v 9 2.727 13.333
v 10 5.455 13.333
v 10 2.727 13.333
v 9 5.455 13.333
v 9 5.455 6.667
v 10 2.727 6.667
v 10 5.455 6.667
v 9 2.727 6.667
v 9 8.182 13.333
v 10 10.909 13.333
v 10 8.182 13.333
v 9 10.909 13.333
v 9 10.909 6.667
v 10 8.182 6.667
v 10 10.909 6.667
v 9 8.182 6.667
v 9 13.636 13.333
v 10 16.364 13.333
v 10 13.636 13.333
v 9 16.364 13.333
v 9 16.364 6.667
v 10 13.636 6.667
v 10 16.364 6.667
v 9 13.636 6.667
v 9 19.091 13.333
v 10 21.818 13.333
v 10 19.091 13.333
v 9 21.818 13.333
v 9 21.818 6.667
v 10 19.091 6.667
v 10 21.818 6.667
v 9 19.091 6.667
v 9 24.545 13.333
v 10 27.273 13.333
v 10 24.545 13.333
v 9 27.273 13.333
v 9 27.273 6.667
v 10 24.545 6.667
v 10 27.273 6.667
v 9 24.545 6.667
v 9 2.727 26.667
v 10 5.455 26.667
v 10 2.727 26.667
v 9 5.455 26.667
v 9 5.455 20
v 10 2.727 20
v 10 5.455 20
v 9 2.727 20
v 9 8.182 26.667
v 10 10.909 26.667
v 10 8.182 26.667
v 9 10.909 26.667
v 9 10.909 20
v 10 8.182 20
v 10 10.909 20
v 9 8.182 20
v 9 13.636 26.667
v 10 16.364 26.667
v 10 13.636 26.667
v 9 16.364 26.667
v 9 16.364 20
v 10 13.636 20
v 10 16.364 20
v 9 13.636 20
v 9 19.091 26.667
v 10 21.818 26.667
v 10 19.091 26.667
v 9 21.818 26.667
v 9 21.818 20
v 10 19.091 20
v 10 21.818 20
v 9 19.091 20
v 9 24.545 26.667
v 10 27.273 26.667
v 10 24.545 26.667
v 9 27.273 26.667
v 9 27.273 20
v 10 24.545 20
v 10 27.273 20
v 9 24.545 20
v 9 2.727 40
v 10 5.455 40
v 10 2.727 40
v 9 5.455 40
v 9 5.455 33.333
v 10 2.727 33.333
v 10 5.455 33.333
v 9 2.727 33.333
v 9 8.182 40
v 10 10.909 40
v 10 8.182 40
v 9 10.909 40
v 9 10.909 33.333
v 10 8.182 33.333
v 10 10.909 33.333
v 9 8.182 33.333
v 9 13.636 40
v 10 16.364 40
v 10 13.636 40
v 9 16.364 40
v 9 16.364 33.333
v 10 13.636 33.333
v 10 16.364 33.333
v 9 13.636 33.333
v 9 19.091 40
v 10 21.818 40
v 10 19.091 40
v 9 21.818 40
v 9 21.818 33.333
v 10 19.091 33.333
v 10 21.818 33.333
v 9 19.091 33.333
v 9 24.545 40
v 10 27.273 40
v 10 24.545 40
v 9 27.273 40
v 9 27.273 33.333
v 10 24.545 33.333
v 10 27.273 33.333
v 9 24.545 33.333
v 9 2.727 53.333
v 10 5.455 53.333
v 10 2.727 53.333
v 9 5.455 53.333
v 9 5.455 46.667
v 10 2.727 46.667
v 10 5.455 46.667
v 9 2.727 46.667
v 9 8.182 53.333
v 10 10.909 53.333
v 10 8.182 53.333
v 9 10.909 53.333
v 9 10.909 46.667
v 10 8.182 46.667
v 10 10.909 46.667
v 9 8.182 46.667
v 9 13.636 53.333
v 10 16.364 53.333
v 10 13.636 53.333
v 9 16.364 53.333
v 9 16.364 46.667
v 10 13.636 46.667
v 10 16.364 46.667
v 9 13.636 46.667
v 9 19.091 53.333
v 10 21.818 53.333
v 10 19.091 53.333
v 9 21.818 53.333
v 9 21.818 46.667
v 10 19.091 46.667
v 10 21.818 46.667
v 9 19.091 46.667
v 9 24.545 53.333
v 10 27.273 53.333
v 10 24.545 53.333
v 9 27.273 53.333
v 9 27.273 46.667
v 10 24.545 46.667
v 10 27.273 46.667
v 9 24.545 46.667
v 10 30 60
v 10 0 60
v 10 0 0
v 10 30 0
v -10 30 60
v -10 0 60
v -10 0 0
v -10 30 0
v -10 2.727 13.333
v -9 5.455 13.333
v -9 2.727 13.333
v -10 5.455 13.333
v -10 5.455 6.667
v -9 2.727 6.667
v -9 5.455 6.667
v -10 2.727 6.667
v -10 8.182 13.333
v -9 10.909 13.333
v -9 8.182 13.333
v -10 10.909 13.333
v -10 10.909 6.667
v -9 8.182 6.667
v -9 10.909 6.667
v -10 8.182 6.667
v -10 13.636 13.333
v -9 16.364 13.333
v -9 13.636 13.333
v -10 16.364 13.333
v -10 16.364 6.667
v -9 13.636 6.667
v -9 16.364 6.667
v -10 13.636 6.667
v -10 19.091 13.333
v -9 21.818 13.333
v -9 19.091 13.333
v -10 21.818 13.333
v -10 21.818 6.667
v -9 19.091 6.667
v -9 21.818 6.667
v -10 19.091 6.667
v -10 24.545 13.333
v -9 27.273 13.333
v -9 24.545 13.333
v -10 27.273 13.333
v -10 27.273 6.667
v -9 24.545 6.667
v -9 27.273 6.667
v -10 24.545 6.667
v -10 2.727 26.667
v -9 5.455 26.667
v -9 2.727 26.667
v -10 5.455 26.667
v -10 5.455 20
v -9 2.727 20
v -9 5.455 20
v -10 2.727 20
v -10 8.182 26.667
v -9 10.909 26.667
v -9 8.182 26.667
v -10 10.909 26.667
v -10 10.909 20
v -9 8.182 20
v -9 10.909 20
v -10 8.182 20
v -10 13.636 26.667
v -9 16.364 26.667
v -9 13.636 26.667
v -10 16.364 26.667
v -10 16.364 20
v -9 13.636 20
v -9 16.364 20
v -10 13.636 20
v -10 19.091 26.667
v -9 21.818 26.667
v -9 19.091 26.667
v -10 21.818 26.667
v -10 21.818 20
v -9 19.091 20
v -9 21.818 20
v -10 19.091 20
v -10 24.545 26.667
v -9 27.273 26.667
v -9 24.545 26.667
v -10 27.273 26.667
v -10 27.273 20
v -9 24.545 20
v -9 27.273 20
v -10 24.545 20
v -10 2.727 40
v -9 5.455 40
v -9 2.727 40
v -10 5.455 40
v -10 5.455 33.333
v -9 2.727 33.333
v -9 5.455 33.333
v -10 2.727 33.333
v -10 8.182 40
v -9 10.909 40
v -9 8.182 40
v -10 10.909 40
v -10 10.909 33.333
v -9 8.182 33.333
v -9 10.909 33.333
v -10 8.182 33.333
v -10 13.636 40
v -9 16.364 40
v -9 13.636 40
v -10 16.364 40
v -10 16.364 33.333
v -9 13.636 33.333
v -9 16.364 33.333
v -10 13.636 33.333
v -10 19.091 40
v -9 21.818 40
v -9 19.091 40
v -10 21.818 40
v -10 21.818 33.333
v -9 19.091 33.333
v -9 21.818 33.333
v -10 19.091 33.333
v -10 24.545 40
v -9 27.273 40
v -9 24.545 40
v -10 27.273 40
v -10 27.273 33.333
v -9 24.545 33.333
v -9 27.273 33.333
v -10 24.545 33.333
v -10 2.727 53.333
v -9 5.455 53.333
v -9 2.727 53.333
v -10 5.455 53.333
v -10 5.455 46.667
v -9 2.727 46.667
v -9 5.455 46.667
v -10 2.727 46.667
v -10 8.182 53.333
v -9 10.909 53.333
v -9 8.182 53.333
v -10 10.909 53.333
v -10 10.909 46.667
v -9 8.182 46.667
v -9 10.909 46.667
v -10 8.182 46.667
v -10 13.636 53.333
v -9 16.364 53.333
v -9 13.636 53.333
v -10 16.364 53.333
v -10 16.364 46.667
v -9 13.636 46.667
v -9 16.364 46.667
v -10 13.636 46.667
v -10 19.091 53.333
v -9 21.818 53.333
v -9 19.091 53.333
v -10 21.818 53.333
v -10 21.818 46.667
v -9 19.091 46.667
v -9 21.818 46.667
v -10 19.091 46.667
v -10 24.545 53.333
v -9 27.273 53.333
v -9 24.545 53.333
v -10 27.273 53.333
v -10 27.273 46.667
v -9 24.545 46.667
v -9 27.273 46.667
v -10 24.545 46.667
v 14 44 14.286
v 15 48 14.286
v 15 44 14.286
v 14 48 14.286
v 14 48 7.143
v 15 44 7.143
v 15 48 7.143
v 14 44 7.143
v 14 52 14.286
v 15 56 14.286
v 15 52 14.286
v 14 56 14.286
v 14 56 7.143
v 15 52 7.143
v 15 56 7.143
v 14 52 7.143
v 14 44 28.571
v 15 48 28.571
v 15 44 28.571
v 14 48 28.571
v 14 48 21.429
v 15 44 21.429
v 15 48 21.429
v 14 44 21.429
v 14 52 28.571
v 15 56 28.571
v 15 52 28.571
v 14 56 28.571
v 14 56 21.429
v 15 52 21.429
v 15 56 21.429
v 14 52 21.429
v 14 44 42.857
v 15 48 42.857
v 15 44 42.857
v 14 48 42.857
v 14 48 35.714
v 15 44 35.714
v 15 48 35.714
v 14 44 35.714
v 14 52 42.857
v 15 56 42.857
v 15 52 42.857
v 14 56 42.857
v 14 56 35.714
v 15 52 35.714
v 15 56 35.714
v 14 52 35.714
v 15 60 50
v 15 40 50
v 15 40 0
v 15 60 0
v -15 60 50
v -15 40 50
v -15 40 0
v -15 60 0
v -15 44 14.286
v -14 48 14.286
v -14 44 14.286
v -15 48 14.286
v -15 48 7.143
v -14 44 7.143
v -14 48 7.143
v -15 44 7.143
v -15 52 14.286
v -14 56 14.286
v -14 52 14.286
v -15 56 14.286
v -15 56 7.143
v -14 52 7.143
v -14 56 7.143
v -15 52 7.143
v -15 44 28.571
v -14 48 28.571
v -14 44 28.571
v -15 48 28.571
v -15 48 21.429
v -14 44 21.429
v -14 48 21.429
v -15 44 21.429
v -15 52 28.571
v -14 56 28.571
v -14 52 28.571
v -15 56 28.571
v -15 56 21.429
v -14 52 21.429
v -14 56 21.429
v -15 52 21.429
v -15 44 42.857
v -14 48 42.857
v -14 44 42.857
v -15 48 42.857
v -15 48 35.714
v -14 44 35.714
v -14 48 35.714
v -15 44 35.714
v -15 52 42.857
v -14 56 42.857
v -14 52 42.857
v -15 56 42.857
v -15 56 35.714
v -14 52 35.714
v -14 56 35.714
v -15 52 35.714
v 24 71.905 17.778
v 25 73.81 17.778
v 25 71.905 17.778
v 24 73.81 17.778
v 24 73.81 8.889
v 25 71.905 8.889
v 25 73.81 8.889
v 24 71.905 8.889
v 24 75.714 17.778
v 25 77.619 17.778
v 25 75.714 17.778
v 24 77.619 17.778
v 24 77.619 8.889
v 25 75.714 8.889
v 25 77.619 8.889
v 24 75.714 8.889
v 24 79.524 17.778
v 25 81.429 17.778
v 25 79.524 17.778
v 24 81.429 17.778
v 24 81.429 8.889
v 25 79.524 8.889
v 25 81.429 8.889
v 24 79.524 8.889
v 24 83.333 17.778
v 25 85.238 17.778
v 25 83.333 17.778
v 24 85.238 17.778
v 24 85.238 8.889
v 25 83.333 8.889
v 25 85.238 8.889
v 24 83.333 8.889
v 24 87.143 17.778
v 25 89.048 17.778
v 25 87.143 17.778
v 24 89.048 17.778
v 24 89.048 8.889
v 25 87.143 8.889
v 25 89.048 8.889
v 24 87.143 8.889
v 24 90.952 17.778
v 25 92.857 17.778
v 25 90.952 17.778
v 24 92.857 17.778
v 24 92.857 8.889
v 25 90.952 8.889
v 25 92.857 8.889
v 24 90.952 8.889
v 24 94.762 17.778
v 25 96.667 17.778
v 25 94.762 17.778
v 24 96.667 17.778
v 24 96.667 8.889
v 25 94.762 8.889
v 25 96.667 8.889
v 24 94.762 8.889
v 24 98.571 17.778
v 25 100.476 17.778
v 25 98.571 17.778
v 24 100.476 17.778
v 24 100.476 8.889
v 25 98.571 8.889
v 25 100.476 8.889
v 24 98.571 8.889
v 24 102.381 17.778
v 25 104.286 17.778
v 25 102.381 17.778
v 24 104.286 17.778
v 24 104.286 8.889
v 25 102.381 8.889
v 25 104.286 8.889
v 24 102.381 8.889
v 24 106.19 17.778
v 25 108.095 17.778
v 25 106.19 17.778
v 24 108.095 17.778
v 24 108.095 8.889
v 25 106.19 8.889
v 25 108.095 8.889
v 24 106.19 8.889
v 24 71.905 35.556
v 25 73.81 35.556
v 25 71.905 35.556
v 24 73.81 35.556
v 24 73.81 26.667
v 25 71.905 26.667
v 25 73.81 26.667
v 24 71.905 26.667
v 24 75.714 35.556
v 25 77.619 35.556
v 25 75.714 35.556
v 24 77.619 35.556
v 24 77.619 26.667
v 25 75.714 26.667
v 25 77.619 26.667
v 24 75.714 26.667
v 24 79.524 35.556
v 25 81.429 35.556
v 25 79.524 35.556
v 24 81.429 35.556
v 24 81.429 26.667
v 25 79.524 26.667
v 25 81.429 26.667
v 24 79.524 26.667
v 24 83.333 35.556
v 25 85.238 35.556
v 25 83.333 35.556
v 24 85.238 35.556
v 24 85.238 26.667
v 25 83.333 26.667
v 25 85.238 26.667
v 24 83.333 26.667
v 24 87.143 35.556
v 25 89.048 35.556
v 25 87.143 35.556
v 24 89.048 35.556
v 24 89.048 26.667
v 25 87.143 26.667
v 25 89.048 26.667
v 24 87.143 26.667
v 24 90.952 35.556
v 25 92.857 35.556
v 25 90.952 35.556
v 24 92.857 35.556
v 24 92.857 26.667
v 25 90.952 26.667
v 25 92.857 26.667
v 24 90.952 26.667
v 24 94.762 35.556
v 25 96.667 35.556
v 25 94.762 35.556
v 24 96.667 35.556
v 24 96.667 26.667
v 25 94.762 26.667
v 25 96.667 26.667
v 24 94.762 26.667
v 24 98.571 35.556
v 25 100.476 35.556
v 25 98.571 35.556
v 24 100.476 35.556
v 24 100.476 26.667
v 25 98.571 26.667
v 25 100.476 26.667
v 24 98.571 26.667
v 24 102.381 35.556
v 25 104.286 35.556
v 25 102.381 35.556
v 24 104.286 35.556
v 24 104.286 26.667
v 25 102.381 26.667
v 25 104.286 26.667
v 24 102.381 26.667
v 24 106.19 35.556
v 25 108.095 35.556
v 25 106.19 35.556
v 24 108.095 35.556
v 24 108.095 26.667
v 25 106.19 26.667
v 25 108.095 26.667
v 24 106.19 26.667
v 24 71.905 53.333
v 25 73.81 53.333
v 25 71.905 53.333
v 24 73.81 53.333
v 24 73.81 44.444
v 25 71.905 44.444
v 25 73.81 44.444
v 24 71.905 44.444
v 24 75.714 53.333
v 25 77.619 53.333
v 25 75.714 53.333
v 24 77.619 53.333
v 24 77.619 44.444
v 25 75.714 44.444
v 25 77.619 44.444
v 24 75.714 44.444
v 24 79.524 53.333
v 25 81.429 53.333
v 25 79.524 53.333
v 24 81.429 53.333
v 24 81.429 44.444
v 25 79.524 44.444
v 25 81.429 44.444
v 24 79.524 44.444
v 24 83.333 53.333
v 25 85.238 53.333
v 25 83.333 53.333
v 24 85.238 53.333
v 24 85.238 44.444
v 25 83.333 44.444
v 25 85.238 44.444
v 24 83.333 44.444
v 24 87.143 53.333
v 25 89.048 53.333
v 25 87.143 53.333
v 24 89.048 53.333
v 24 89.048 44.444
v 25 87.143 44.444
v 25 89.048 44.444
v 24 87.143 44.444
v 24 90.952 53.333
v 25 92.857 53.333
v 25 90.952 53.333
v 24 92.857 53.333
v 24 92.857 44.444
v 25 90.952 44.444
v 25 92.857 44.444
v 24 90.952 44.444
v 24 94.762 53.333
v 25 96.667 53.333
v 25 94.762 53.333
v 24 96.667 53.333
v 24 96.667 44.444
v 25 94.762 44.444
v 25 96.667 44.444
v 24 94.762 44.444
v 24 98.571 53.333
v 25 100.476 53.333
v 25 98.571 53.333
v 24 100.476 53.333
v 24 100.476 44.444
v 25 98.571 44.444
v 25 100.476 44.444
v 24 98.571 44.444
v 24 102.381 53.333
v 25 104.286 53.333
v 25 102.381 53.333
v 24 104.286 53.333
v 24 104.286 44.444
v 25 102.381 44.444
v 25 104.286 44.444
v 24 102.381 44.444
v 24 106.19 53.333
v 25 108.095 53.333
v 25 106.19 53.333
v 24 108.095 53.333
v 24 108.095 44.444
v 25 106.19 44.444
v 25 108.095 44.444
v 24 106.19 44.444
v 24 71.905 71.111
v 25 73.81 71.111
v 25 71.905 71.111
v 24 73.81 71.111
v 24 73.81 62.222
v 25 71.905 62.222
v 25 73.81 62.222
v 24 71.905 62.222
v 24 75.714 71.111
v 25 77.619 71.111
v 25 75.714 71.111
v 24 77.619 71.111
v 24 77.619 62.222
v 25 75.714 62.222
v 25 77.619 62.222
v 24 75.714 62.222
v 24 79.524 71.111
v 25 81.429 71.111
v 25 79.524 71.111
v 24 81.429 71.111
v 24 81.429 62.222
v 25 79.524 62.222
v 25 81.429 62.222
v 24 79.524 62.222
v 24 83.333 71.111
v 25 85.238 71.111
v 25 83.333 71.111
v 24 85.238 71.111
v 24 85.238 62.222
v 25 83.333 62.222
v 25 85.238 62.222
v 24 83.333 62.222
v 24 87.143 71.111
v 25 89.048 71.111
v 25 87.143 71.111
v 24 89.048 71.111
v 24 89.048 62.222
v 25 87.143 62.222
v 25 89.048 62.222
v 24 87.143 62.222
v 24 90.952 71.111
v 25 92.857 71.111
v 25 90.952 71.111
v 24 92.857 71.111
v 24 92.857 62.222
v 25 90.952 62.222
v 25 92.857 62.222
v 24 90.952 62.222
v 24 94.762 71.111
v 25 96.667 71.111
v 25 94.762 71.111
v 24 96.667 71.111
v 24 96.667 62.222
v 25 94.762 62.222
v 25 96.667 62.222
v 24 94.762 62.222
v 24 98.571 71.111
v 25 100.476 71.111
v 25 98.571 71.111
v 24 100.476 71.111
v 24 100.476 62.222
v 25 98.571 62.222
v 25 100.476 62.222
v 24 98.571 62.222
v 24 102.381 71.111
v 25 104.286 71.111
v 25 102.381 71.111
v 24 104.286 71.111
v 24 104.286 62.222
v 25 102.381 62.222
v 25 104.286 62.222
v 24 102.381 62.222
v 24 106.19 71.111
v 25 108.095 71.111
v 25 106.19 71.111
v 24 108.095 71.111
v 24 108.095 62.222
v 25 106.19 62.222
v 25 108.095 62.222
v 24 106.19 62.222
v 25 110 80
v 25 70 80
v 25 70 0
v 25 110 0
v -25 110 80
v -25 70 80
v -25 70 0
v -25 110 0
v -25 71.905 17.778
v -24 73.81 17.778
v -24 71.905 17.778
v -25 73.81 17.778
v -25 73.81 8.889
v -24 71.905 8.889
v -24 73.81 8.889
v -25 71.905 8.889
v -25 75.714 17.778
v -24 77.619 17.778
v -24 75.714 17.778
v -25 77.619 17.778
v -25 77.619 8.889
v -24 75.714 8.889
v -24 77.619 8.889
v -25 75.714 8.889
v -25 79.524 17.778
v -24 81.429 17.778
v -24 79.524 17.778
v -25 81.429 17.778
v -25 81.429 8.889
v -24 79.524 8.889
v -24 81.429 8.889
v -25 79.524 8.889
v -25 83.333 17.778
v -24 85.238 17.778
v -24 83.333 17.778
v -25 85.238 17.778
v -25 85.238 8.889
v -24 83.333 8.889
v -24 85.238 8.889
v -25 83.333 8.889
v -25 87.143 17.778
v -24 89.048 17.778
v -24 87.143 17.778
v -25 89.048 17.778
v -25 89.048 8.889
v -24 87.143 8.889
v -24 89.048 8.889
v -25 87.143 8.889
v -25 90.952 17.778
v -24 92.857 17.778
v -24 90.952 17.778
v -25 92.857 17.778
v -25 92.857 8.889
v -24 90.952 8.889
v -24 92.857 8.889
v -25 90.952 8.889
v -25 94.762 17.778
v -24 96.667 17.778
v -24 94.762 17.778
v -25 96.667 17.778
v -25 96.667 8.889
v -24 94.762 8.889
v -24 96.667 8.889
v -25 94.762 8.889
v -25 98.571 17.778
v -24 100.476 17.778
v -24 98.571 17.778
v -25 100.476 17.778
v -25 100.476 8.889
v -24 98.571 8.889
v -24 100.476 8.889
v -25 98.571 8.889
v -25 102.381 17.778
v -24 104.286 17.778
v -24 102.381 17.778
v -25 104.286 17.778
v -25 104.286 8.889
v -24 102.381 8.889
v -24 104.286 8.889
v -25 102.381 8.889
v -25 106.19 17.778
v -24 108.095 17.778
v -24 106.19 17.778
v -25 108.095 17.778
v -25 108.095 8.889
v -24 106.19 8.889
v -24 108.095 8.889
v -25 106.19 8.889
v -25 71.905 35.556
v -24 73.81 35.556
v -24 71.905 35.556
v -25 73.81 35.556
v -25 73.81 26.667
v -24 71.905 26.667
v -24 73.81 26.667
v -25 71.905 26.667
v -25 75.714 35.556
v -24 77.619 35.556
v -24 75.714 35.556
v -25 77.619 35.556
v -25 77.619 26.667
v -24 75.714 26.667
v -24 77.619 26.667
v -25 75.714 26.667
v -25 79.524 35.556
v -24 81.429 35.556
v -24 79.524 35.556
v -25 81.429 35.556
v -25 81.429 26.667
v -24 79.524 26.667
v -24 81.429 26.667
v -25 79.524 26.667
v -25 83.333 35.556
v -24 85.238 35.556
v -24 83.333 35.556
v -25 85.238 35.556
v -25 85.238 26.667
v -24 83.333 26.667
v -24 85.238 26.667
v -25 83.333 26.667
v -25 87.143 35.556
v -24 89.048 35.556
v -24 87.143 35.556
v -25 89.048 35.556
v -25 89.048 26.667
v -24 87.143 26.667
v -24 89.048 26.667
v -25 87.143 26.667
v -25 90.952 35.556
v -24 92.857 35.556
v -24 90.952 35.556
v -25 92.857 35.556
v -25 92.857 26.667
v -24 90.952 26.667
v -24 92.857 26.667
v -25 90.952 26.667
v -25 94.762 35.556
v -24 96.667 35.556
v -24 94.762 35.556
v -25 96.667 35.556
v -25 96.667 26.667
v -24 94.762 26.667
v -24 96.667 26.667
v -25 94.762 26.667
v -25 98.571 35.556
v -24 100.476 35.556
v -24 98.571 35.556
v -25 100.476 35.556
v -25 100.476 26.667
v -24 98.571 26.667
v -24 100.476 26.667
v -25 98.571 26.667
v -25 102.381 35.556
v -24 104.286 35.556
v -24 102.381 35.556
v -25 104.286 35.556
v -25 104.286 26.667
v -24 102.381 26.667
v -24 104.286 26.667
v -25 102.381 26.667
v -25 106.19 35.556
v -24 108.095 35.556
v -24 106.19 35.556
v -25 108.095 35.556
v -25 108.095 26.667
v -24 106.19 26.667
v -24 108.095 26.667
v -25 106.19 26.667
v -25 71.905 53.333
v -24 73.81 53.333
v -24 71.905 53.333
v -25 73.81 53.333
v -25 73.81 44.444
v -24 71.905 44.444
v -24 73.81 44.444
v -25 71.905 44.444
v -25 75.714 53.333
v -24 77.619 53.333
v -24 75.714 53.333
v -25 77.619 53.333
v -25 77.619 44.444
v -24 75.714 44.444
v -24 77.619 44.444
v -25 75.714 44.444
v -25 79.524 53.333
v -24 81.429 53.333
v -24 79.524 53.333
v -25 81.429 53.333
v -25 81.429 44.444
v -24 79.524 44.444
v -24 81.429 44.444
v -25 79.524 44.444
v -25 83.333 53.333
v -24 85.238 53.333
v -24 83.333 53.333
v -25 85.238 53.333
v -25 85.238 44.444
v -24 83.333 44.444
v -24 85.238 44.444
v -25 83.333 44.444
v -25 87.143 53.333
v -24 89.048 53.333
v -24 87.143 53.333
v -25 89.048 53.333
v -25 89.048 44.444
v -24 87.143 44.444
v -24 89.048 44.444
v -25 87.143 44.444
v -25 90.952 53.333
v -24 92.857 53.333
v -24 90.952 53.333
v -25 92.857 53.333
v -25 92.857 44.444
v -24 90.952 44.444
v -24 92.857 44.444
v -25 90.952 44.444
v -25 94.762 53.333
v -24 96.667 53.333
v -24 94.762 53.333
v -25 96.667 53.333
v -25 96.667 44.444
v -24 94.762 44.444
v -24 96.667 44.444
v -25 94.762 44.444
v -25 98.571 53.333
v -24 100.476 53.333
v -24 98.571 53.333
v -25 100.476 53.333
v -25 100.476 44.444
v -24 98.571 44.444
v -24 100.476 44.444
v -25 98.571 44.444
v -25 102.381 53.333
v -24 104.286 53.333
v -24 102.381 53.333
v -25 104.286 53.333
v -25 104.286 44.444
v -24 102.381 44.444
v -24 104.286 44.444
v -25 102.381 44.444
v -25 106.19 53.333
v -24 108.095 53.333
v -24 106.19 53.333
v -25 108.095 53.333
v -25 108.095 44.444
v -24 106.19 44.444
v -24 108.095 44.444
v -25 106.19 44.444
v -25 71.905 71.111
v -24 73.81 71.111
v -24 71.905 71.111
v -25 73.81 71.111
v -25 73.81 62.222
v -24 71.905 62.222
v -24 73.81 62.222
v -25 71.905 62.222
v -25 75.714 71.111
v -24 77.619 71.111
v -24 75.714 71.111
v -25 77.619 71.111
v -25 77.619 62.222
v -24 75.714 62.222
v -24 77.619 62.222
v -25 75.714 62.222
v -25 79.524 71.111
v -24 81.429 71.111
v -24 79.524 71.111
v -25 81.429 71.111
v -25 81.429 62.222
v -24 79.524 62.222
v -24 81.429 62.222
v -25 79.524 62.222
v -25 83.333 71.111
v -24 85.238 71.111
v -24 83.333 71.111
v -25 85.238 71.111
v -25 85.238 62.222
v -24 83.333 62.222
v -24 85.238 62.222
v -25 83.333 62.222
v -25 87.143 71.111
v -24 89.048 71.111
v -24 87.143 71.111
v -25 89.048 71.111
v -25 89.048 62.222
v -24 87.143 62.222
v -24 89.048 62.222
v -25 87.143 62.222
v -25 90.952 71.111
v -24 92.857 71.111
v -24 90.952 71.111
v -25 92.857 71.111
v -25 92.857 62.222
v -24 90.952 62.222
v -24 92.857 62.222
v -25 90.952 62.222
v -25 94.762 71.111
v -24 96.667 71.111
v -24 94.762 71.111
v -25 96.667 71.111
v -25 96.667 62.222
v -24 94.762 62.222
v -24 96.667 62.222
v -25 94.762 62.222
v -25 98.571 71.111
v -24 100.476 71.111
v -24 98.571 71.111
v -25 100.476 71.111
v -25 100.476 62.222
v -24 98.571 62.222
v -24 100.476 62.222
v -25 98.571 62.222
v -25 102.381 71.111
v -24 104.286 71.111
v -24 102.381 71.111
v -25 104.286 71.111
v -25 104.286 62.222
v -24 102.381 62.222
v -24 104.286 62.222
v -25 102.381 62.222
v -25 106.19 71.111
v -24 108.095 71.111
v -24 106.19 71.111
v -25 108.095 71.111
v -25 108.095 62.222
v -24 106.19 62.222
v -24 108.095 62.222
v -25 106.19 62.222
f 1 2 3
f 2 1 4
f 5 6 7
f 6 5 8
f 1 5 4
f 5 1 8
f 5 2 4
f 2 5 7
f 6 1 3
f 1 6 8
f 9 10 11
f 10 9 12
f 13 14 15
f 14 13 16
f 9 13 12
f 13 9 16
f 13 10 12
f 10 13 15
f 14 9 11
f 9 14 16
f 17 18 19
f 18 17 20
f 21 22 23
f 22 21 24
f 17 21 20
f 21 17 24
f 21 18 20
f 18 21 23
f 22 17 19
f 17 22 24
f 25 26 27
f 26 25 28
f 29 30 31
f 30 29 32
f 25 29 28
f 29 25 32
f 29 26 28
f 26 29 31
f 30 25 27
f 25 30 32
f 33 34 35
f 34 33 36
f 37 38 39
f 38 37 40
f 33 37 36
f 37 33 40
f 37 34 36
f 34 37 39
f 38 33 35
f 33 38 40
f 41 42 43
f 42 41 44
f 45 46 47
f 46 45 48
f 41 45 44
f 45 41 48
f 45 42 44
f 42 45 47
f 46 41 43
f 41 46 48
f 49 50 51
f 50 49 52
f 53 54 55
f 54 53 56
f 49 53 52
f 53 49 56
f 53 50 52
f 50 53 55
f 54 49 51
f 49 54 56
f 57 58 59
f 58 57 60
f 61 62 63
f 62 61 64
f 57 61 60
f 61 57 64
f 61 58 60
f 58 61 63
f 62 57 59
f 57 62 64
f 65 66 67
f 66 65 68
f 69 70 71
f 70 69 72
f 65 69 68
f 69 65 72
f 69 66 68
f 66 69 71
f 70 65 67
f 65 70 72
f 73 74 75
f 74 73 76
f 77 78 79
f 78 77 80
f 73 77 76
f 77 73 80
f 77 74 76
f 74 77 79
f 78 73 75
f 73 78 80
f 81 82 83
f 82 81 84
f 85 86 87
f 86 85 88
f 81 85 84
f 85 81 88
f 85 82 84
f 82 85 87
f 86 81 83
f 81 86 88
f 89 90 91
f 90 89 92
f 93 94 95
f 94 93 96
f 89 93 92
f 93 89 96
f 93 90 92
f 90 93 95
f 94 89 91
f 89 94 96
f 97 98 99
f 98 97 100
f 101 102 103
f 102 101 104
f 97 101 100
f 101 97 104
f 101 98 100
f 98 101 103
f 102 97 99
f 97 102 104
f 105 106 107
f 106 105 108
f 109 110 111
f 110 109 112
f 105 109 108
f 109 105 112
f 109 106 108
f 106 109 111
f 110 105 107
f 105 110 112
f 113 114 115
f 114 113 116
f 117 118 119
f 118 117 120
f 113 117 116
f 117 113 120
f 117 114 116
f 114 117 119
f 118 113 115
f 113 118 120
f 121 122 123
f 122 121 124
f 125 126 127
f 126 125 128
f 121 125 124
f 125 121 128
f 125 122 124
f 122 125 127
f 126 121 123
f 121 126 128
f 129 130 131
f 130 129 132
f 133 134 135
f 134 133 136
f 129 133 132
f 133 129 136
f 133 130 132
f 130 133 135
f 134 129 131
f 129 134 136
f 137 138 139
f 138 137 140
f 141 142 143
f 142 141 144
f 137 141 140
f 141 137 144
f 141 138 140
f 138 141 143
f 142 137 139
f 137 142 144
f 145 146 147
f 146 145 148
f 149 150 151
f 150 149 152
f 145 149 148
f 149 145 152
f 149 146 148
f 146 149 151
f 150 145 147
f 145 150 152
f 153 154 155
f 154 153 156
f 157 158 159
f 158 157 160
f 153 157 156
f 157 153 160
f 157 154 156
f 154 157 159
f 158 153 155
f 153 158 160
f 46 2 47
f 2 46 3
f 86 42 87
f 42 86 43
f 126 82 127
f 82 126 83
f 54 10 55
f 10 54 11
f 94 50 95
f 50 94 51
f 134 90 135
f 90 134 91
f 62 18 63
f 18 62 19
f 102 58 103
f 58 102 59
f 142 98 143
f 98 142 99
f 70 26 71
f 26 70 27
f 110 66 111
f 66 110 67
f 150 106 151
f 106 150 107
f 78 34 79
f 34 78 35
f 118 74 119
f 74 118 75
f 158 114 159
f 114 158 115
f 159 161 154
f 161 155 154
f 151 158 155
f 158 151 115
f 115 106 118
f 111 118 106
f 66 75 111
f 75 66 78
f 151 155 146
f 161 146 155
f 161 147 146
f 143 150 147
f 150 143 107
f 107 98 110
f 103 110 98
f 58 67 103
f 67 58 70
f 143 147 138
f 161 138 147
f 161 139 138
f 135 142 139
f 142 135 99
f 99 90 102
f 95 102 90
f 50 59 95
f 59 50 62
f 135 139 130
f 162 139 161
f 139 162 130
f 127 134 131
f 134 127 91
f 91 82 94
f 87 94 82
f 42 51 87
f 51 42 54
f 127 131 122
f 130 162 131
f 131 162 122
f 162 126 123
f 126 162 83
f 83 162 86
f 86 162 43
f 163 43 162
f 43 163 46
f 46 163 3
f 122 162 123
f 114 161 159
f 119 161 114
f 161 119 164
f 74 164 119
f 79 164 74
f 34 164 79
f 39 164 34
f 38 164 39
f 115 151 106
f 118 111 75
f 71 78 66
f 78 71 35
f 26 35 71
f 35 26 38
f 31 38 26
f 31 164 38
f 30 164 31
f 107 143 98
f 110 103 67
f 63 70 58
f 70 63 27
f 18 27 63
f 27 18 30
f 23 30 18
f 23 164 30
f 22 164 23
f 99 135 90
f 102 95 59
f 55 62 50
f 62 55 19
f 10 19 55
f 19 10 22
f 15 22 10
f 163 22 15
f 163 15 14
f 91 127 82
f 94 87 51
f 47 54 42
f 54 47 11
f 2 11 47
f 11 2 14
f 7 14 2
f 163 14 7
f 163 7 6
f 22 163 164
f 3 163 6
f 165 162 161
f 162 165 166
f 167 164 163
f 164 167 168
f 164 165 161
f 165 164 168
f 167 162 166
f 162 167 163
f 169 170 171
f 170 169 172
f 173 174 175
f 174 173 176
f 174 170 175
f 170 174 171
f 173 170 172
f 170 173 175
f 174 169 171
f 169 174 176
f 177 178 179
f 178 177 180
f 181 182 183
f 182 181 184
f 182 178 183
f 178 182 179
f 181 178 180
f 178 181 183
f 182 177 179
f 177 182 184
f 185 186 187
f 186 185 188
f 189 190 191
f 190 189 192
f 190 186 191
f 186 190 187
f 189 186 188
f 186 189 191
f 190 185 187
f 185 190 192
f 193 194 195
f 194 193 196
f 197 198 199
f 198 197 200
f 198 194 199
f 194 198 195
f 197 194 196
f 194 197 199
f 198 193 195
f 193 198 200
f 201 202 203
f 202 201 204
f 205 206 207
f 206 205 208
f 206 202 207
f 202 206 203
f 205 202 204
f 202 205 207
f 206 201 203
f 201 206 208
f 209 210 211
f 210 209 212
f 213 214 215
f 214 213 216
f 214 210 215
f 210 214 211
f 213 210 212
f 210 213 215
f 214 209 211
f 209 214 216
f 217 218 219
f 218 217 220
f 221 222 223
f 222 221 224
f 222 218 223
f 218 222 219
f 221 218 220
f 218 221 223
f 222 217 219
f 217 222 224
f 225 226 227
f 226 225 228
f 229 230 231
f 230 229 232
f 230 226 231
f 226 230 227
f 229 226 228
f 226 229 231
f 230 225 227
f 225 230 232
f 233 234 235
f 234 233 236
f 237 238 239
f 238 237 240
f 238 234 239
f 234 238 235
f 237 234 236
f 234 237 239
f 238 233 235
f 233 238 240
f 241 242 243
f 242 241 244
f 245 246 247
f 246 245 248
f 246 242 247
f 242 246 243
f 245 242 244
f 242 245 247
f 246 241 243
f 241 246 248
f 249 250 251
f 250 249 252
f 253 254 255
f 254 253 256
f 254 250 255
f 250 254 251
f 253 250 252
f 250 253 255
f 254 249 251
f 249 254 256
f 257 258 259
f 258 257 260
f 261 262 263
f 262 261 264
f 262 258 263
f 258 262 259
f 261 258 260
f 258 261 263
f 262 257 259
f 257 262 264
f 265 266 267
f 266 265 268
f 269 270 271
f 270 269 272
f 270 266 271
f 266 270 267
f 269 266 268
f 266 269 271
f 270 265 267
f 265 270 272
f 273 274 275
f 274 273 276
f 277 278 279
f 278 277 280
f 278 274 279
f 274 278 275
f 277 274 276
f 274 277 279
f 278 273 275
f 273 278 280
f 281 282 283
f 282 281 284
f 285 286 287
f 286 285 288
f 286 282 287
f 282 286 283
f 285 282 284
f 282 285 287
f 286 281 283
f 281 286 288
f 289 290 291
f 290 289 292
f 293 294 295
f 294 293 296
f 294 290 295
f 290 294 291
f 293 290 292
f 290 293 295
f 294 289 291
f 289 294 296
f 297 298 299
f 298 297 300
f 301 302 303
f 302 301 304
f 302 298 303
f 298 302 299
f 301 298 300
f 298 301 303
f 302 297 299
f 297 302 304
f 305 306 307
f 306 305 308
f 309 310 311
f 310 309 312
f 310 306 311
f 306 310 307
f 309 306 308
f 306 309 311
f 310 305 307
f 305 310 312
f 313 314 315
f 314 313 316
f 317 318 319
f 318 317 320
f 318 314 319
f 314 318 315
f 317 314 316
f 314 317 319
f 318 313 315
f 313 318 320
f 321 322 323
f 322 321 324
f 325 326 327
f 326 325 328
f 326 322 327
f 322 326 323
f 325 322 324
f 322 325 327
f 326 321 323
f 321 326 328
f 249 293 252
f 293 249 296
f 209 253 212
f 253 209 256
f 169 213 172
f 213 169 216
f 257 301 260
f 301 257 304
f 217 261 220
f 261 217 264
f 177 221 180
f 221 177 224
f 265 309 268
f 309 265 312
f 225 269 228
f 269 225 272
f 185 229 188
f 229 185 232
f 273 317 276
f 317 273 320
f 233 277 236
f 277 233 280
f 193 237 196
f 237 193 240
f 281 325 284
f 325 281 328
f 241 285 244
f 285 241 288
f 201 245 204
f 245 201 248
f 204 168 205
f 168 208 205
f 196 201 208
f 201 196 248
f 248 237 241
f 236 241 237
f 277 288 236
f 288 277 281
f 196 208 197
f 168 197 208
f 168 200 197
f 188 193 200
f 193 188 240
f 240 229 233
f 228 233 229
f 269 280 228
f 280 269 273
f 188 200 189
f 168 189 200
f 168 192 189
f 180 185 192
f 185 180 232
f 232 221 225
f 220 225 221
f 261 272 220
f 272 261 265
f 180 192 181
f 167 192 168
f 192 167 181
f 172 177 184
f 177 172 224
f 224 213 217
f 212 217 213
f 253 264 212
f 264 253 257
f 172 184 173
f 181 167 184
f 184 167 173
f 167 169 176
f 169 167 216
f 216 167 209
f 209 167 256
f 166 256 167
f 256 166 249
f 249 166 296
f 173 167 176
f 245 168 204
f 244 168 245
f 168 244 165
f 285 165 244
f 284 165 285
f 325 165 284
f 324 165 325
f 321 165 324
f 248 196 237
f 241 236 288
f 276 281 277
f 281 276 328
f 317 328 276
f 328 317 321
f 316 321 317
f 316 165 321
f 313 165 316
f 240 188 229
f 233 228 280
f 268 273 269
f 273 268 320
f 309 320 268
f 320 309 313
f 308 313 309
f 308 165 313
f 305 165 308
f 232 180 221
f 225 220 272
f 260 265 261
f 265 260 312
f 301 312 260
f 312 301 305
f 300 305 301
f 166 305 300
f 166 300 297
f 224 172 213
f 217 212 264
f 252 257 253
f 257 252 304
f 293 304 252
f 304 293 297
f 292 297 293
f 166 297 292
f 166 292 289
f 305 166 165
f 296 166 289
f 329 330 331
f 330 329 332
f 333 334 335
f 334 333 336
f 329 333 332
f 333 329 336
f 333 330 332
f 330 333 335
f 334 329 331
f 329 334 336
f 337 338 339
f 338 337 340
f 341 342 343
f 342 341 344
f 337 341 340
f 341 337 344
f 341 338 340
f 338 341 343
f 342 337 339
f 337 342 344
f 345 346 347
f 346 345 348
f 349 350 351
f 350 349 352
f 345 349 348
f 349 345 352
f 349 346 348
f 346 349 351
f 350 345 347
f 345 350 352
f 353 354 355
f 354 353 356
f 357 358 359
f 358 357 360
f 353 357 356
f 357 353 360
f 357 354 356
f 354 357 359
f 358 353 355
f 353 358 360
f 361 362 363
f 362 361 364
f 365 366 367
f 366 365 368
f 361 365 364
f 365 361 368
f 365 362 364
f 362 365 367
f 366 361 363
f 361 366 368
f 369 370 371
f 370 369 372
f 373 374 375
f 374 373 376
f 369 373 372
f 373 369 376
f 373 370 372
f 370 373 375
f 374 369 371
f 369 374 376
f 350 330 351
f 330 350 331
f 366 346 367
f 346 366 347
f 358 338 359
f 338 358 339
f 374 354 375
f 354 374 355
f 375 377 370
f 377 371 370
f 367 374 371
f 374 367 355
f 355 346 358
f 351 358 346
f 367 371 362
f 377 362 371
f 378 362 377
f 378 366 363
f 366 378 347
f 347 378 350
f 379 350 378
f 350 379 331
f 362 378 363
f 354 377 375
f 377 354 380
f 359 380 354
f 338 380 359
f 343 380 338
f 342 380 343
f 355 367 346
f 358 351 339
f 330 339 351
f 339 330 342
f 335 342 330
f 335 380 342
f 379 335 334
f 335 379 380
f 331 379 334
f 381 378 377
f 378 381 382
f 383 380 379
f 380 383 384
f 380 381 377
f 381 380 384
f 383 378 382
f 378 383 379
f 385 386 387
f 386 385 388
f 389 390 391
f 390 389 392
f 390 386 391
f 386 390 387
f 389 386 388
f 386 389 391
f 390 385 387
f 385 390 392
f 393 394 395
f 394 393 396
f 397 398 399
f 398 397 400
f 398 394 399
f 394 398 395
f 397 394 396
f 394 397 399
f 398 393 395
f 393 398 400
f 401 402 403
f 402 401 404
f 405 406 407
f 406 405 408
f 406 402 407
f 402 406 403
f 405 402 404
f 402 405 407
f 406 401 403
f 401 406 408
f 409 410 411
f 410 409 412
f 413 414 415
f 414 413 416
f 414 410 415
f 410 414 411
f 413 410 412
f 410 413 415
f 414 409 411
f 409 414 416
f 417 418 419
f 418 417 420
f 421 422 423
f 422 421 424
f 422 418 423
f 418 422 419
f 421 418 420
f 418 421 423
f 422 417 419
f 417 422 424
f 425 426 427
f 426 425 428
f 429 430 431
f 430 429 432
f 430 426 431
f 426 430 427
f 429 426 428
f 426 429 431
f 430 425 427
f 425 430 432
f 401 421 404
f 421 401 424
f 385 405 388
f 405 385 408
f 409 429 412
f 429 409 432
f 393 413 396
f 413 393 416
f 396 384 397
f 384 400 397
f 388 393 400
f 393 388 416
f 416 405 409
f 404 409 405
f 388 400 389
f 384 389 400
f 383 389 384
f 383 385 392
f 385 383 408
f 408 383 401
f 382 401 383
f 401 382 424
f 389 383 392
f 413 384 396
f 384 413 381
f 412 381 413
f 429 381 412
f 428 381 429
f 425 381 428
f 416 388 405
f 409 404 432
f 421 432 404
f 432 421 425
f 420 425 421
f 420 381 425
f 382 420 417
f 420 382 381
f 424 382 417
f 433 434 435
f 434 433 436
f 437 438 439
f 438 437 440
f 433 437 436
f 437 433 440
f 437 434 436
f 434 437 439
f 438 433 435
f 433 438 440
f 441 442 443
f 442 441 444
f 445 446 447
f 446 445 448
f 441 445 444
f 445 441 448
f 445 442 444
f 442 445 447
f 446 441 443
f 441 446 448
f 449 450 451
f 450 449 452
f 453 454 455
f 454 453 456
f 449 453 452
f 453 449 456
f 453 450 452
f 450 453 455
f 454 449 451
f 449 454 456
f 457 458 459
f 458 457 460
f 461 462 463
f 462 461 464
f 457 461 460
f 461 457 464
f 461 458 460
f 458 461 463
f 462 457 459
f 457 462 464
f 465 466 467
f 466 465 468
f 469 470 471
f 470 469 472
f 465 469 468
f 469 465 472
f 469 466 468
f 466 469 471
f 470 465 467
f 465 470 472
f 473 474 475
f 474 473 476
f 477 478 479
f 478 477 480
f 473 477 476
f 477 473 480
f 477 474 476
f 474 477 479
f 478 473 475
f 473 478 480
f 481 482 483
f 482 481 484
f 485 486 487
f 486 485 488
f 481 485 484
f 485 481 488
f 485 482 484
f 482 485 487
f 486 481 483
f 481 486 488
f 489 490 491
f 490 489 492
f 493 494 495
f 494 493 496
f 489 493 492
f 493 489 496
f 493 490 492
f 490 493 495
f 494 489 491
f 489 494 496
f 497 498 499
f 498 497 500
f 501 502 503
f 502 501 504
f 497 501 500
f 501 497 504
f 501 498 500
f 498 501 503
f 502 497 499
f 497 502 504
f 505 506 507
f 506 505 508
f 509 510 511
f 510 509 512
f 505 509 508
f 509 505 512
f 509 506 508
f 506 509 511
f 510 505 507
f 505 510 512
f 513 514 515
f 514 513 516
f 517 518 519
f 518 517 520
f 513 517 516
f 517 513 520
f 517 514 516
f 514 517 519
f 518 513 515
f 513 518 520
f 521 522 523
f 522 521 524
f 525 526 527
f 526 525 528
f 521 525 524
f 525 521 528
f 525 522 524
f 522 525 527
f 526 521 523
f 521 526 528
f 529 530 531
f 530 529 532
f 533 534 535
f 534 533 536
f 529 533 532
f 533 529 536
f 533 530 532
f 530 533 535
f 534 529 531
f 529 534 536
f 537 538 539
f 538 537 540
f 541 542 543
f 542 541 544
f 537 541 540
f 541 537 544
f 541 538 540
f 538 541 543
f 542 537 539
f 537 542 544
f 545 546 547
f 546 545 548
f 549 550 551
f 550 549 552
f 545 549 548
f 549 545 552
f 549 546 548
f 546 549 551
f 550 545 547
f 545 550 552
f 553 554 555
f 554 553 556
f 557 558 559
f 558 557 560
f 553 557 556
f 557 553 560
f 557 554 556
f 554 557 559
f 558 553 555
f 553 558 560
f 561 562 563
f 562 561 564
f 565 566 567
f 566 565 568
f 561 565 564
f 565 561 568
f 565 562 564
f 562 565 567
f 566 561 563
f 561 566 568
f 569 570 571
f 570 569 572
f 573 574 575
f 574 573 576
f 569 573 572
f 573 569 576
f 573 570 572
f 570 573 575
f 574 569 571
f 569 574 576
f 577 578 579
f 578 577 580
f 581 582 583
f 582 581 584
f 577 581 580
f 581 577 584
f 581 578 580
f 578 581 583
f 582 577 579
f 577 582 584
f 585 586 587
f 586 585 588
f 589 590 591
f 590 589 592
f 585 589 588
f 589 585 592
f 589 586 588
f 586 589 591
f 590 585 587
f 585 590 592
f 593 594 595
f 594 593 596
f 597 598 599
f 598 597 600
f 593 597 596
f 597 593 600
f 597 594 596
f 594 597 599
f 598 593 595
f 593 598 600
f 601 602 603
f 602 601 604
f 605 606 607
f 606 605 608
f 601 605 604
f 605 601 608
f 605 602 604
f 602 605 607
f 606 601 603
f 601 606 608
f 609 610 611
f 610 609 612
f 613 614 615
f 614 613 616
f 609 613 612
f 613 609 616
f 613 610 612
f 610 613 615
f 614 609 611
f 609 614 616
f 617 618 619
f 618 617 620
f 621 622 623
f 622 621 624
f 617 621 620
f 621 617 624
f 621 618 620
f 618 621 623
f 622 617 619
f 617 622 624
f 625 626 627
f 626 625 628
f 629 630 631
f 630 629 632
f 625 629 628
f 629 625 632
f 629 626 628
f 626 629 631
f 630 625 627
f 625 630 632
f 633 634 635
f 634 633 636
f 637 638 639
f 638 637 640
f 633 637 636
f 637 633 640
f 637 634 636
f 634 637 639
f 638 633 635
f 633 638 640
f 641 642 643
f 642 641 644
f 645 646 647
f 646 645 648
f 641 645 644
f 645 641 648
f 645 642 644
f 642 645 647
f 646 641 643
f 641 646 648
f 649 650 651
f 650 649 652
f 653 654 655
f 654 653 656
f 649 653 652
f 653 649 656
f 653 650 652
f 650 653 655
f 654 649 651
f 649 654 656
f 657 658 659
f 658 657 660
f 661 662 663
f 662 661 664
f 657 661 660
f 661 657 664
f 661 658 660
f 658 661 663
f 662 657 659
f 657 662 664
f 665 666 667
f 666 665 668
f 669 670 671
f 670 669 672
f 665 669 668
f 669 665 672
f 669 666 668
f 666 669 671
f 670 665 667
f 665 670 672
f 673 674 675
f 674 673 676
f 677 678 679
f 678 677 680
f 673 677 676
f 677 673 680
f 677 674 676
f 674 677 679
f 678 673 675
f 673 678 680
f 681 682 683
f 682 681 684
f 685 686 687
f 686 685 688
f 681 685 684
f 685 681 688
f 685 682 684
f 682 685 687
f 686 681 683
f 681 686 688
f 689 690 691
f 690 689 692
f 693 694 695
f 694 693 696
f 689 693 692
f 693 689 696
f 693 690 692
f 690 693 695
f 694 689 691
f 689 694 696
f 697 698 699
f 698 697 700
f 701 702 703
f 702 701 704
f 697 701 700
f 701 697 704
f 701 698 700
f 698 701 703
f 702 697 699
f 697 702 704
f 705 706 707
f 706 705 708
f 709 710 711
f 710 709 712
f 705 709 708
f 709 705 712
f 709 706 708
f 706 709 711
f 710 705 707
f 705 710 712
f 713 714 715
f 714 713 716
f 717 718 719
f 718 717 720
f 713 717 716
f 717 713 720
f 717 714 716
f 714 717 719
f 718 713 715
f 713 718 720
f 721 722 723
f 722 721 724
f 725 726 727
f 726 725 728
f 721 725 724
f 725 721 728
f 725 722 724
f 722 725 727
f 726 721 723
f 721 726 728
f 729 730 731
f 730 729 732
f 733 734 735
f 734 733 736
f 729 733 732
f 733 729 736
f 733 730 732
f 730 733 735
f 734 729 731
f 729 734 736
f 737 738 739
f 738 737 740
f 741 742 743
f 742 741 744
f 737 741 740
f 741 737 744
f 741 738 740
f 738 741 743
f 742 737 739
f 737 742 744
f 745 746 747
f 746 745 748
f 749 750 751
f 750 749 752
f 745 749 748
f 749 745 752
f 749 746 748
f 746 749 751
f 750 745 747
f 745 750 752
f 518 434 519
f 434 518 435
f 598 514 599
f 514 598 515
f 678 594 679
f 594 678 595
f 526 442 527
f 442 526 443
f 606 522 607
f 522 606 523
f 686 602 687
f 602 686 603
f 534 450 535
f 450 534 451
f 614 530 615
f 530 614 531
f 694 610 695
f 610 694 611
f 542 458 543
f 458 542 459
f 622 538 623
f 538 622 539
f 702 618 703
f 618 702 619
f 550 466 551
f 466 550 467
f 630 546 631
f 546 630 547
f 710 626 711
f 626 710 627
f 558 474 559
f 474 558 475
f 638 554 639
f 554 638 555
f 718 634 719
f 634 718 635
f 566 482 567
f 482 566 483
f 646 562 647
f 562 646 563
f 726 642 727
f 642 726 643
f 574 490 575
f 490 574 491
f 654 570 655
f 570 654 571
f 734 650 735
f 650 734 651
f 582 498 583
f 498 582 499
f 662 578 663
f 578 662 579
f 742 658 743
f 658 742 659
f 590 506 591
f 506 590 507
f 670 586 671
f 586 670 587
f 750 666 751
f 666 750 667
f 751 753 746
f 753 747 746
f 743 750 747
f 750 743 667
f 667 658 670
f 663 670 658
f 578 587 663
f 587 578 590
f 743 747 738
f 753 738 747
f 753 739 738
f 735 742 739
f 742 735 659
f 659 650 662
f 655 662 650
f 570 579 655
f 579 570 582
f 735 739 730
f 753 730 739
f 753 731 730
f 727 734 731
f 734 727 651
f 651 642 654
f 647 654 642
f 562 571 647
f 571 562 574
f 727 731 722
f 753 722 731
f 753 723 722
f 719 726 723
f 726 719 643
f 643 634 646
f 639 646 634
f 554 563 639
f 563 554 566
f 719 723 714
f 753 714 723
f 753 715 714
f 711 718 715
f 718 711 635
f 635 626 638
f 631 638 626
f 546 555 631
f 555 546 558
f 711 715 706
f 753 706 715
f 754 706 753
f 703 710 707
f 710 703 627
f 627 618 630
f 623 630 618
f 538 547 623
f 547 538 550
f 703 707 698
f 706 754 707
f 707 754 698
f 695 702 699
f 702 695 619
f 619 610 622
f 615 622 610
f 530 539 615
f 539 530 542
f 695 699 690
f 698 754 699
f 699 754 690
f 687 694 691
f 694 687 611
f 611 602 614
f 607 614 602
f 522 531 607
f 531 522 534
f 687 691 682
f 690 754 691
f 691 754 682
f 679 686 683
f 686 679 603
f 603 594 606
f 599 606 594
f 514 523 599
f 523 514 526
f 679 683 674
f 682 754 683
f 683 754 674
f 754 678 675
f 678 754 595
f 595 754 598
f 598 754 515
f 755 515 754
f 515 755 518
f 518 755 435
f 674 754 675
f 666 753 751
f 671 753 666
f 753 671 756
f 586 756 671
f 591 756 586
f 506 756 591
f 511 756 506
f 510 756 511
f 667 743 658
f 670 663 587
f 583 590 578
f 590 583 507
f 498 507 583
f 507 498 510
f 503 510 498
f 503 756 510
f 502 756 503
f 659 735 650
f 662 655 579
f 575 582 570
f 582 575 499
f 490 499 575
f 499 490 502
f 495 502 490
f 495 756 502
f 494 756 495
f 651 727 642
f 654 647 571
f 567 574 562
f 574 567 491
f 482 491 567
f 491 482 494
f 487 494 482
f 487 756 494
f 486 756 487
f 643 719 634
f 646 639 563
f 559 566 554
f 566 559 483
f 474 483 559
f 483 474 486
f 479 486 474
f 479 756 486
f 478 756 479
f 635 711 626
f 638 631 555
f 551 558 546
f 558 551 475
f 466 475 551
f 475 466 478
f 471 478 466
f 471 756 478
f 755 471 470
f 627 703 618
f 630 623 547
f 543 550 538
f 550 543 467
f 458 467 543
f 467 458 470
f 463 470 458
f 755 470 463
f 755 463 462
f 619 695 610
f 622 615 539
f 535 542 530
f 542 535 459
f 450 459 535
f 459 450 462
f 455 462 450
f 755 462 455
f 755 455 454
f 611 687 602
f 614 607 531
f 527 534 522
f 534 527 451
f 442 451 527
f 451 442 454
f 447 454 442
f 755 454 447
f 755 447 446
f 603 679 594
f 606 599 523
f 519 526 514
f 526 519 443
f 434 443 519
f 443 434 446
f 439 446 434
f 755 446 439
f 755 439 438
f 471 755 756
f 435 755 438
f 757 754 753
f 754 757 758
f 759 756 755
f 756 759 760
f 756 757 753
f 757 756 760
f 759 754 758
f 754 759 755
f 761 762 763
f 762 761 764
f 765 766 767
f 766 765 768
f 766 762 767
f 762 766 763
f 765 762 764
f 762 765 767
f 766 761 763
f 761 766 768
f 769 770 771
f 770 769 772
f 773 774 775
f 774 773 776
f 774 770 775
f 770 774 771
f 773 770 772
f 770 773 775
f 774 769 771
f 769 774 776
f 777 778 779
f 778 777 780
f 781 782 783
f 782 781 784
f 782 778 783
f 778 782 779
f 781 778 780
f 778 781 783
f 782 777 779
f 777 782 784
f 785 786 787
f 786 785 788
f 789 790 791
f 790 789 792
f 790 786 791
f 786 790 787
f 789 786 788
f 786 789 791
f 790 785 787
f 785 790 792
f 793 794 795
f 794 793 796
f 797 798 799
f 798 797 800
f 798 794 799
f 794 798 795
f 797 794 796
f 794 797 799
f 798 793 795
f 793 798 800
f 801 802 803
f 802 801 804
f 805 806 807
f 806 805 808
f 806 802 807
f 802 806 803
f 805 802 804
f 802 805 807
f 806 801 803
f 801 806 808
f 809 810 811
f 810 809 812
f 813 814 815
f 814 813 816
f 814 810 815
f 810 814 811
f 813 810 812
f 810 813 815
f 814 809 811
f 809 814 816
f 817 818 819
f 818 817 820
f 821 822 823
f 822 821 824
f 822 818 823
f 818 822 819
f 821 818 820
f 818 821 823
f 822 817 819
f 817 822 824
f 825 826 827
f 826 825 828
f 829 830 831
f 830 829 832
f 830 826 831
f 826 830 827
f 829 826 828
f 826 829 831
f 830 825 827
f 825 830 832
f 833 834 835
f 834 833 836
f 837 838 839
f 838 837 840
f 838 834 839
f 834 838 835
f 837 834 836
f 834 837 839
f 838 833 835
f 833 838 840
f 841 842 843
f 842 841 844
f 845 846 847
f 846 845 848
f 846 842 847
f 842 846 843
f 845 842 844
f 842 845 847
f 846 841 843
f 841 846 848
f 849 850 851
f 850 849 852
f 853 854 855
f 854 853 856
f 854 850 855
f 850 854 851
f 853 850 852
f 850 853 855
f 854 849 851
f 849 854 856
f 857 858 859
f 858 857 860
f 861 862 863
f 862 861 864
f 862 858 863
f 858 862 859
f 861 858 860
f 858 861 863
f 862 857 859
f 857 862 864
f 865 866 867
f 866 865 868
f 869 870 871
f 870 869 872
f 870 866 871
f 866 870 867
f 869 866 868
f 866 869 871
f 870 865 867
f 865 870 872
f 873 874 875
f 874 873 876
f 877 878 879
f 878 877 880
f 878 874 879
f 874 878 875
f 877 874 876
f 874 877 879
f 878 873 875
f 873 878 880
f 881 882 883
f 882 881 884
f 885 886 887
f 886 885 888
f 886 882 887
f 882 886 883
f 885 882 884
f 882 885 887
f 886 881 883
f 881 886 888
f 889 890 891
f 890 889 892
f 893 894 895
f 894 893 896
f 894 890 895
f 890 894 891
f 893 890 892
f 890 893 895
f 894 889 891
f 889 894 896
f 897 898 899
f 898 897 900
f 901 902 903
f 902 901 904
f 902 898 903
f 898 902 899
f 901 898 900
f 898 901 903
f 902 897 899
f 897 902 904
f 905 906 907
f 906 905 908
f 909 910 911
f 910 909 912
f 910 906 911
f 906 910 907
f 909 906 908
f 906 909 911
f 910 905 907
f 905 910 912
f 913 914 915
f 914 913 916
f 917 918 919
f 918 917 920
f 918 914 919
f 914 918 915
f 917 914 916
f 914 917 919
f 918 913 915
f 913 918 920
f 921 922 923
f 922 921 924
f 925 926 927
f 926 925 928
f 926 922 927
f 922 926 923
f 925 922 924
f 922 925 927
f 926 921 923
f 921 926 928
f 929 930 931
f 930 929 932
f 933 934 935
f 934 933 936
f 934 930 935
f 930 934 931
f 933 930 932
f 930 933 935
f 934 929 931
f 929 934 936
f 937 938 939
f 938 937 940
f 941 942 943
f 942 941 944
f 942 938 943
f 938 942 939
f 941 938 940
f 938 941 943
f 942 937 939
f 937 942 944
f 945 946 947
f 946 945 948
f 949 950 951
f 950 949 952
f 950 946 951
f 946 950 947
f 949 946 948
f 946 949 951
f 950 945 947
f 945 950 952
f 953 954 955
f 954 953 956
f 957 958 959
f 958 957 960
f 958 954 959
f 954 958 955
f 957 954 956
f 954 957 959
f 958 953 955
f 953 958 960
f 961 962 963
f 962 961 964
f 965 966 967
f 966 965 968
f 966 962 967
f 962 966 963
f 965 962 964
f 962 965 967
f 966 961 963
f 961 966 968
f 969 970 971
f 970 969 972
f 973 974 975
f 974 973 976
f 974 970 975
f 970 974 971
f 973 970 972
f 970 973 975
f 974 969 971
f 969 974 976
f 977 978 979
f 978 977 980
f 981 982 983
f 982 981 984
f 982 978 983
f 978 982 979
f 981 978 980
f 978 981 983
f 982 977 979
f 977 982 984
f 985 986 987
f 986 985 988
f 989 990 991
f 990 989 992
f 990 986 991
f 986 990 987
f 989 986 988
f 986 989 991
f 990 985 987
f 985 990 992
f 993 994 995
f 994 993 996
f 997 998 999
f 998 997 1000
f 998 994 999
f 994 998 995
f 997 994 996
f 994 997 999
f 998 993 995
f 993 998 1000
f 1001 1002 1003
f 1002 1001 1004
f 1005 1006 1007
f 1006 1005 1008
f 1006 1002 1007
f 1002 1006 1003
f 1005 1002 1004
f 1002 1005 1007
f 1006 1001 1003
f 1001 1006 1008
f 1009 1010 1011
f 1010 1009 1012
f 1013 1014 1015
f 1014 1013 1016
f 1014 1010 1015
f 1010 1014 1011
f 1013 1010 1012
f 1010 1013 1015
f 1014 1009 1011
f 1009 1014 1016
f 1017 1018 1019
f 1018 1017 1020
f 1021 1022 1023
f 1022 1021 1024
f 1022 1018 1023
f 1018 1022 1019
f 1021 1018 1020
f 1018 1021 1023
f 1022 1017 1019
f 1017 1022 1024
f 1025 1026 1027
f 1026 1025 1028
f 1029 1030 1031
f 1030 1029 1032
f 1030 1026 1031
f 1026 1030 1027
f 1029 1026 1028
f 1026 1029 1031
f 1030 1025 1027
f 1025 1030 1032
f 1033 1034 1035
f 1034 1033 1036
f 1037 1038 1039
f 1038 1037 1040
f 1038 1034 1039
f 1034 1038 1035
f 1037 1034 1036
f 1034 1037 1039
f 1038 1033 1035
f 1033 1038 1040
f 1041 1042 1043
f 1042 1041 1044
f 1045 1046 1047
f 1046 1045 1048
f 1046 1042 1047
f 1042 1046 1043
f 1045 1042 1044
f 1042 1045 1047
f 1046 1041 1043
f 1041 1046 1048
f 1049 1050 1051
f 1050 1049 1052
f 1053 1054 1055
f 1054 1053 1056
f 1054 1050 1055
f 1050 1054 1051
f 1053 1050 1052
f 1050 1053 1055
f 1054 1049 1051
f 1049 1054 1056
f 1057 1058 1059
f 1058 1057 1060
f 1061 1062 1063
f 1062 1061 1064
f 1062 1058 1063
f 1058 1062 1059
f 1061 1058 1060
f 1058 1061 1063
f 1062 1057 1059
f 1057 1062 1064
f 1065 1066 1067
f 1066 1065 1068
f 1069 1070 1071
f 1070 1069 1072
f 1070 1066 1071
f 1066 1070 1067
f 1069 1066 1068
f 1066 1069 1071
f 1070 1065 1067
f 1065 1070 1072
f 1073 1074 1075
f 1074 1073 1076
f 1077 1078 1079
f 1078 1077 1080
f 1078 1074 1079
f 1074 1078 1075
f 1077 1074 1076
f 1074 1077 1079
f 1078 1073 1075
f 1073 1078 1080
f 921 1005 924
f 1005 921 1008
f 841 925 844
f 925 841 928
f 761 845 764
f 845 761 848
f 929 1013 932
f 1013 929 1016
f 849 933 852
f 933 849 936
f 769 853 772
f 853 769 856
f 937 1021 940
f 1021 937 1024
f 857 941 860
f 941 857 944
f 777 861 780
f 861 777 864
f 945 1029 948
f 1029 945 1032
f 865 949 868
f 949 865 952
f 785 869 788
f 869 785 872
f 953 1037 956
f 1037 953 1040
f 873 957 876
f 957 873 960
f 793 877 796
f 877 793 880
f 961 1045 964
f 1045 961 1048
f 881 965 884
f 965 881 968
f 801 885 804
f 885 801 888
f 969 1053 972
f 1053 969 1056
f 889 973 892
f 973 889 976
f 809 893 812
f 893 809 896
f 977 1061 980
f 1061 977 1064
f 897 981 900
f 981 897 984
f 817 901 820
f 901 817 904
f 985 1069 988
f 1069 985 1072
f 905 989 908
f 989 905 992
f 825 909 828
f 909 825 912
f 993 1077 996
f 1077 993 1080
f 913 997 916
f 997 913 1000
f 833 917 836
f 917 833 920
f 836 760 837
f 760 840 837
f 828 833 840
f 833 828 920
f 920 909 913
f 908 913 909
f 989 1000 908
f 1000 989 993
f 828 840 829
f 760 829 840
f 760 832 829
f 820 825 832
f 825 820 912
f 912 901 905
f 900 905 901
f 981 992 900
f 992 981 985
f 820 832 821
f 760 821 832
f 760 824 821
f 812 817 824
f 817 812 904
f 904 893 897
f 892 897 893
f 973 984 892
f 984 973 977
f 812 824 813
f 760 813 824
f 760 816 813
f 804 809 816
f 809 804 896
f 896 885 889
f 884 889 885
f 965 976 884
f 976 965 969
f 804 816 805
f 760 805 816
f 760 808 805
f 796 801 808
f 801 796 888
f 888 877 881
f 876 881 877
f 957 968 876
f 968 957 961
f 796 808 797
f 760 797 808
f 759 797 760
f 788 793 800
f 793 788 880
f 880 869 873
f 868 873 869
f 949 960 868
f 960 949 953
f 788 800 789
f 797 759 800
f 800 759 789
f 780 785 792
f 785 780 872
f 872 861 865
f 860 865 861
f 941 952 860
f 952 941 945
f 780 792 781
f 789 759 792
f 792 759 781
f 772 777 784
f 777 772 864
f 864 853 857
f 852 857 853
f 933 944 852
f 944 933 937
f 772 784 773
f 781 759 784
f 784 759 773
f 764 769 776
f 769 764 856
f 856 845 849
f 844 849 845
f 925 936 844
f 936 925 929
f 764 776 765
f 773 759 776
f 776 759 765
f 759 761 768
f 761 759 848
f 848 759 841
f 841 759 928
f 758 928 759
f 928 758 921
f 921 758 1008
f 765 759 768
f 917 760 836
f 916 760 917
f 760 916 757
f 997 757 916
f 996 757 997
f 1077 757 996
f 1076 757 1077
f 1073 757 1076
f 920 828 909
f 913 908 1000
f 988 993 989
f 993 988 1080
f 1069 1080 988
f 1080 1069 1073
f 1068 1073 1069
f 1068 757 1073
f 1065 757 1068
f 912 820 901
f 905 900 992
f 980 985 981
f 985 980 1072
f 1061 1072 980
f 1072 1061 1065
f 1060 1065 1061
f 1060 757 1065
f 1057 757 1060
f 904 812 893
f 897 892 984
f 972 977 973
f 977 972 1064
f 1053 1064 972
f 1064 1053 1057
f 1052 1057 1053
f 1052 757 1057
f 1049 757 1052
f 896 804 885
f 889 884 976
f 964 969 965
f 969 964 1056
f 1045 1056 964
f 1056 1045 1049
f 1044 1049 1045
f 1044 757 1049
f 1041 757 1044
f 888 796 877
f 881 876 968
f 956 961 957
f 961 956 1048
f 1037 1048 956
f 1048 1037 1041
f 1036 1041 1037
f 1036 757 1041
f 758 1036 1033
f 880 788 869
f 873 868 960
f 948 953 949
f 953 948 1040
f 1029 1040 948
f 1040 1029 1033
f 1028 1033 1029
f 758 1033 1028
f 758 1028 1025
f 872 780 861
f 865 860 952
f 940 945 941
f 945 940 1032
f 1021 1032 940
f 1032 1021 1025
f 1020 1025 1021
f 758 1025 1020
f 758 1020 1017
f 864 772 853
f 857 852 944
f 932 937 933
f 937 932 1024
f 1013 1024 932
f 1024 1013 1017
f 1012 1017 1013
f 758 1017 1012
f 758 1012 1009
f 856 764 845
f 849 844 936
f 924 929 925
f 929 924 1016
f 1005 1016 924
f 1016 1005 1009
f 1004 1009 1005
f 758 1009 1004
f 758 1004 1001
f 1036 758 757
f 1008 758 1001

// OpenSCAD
building(20, 30, 60, 5, 4, true);
translate([0,40,0]) building(30, 20, 50, 2, 3, true);
translate([0,70,0]) building(50, 40, 80, 10, 4, true);

module building(b_width, b_length, b_height, window_cols, window_rows, doors){
  windows(b_width/2, b_length, b_height,window_cols, window_rows );
   mirror([1,0,0]) windows(b_width/2, b_length, b_height, window_cols,  window_rows);
}//building

module windows(b_width, b_length, b_height, window_cols, window_rows){
    
  w_length = b_length/(2*window_cols+1);
  w_height = b_height/(2*window_rows+1);

  difference(){
    cube([b_width, b_length, b_height]); 
        
    for(z=[w_height:2*w_height:b_height-w_height]){
      for(y=[ w_length : 2* w_length : b_length-w_length]){
          translate([b_width-1,y,z]) cube([2,  w_length , w_height]);
      }
    }//windows
  }//difference
}//facade
